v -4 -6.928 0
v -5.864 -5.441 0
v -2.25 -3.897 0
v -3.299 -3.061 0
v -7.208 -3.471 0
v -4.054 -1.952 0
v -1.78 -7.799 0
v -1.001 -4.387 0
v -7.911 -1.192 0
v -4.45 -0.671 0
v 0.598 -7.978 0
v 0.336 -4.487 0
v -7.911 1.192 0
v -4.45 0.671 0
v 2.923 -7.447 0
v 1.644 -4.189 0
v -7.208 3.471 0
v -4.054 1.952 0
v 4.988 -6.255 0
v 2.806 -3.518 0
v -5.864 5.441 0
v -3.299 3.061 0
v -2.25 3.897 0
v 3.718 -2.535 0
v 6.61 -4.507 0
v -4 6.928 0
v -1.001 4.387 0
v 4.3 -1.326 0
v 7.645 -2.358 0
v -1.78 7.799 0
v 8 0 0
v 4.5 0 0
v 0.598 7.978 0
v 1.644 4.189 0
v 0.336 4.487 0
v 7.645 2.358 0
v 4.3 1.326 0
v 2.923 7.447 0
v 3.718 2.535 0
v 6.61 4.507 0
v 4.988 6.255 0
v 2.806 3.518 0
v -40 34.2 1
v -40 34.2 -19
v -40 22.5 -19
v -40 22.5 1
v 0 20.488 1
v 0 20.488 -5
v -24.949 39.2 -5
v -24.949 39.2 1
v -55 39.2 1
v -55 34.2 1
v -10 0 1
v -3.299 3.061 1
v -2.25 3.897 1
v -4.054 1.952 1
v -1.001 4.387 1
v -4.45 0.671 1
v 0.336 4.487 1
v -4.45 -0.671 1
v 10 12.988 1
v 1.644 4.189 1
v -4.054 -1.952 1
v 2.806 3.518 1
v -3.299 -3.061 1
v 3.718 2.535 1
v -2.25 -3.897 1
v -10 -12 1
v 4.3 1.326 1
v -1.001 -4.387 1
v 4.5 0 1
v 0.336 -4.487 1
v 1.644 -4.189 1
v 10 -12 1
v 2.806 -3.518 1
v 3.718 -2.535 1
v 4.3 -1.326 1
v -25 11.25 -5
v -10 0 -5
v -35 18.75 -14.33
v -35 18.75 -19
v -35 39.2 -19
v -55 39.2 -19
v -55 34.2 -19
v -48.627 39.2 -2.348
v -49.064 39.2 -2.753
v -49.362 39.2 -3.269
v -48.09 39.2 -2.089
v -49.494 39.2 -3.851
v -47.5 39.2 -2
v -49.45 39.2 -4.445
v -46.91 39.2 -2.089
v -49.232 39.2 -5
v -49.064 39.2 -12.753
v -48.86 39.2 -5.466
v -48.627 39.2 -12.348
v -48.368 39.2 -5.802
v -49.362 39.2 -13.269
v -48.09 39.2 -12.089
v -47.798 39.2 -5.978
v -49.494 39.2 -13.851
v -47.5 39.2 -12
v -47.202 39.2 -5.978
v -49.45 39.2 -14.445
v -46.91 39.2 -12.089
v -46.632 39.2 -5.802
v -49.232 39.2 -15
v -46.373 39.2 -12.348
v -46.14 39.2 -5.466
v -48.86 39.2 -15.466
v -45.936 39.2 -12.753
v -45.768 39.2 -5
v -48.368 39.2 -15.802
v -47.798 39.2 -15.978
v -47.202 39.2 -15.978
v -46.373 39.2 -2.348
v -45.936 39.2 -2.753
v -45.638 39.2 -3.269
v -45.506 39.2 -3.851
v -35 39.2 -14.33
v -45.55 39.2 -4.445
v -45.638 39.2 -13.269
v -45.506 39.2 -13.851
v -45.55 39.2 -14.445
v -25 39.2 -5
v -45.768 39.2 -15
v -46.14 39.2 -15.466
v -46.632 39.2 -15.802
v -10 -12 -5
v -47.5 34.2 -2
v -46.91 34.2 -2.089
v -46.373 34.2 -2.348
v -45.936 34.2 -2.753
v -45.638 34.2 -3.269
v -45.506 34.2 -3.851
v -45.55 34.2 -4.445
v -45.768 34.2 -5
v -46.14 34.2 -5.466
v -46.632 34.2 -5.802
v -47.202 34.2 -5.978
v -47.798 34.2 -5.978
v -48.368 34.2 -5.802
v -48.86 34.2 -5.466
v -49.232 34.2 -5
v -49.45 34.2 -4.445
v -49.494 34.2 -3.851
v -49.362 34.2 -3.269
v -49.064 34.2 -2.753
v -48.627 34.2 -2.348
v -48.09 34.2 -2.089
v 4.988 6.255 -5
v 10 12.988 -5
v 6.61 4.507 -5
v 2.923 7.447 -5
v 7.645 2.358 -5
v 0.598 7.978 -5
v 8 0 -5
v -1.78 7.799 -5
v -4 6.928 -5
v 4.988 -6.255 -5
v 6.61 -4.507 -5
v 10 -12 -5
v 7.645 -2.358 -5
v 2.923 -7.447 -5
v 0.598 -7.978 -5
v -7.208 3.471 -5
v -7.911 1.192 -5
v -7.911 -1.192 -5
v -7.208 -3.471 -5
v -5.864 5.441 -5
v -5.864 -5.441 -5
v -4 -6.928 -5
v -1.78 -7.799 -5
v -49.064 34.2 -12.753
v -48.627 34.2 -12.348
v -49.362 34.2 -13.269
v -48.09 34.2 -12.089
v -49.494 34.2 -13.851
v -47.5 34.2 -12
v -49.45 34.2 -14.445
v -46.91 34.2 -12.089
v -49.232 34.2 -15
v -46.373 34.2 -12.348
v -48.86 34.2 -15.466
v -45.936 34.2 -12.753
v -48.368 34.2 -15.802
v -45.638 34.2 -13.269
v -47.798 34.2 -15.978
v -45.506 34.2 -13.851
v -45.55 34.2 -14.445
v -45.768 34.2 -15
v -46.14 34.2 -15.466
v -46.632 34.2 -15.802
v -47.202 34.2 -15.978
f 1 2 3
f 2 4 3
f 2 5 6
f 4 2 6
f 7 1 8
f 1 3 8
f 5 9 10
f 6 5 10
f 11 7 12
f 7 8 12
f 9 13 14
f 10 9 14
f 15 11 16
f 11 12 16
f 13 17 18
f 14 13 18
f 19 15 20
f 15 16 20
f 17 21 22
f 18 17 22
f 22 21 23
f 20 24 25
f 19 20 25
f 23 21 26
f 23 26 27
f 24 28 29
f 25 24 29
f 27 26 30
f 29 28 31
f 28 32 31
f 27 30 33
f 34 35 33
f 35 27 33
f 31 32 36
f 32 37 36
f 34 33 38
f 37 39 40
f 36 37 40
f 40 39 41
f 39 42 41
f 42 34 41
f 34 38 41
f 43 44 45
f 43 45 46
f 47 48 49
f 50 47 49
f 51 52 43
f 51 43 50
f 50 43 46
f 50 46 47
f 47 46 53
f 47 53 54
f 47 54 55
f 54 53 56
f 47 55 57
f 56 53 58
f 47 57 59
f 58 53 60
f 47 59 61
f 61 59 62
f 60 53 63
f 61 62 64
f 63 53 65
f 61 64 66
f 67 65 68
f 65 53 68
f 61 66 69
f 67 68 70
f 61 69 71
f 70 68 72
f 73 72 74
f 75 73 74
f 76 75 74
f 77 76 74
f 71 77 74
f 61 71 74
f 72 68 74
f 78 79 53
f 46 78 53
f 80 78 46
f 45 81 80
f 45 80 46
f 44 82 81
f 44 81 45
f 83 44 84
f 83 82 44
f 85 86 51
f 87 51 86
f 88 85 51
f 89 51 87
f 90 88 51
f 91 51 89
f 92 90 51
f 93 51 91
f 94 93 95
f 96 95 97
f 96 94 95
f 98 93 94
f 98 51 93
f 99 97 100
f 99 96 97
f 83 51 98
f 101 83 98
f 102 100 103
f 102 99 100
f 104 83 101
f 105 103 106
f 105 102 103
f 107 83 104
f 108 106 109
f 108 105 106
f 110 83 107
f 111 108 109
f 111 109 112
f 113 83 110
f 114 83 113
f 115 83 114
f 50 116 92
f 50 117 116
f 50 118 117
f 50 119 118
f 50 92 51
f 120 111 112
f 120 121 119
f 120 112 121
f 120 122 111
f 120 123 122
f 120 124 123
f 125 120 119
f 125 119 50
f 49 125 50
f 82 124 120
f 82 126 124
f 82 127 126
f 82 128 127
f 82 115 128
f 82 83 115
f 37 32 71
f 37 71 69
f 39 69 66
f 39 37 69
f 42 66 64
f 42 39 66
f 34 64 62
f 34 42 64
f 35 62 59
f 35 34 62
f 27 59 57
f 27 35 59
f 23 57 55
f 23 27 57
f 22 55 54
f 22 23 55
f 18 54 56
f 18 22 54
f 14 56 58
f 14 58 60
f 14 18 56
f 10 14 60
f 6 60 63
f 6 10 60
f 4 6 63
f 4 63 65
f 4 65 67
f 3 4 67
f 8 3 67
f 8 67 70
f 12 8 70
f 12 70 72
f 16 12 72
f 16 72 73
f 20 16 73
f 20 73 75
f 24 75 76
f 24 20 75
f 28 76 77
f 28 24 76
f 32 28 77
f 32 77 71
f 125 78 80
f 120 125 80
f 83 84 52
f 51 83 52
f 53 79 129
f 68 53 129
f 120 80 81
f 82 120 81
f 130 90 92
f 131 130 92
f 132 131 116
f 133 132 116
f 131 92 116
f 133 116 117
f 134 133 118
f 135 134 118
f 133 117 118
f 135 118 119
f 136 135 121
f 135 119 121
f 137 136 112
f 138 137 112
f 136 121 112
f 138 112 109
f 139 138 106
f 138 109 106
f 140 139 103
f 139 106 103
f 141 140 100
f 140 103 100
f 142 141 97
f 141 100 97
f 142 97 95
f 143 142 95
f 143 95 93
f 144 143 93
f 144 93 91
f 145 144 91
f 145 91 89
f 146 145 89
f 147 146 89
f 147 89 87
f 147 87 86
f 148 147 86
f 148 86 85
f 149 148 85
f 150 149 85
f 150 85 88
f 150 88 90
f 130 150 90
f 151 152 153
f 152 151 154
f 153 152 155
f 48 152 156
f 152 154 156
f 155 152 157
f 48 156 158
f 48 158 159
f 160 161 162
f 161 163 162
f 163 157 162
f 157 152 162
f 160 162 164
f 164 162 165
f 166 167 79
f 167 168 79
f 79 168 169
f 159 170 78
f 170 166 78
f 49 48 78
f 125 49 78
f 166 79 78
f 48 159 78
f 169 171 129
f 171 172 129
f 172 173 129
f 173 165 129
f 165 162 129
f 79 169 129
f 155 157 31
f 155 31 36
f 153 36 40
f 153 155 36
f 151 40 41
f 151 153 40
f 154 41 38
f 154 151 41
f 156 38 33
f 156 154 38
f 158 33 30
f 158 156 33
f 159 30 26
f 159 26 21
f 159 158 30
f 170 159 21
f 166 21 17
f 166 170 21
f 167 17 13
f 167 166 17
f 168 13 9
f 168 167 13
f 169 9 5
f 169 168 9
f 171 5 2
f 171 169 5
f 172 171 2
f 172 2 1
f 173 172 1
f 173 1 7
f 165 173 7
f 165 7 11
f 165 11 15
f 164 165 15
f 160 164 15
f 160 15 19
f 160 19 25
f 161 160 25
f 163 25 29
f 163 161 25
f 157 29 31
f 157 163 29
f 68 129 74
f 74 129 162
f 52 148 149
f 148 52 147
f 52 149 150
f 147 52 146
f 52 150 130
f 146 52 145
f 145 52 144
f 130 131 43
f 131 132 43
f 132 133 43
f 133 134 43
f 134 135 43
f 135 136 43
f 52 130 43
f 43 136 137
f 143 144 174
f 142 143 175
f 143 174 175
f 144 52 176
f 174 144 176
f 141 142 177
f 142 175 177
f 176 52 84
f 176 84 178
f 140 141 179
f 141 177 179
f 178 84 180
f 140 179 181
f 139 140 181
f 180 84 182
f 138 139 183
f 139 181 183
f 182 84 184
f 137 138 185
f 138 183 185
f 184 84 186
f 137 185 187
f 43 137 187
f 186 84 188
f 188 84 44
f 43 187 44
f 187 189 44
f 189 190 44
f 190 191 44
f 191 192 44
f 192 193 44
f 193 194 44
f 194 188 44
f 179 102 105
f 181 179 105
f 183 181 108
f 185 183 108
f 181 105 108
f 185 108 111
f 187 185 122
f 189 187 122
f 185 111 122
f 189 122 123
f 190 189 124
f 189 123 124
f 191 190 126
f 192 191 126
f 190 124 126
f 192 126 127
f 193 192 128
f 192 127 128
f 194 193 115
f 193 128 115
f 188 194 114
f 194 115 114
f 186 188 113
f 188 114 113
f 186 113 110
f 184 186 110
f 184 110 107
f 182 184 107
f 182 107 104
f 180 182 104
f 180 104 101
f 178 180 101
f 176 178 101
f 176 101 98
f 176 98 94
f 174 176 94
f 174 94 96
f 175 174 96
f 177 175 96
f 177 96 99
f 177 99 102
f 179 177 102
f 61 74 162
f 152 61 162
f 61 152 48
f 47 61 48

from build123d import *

# Parameters (mm, degrees)
SKETCH1_R               = 10
SKETCH1_R_2             = 8
SKETCH1_R_3             = 4.5
BOSS_EXTRUDE1_DEPTH     = 1
BOSS_EXTRUDE2_START     = -5
SKETCH1_4_R             = 10
SKETCH1_4_R_2           = 8
BOSS_EXTRUDE2_DEPTH     = 5
BOSS_EXTRUDE3_START     = -6
BOSS_EXTRUDE3_DEPTH     = 6
BOSS_EXTRUDE4_DEPTH     = 5
BOSS_EXTRUDE5_REACH     = 76.3
SKETCH4_R               = 2
CUT_EXTRUDE1_DEPTH      = 78.507677039
CUT_EXTRUDE2_DEPTH      = 71.438909702
CUT_EXTRUDE2_DEPTH_BACK = 71.438909702


with BuildPart() as part:
    # Sketch1 → Boss-Extrude1 (new body)
    # profile 1 of 2: a face of its own
    with BuildSketch(Plane.XY):
        Circle(SKETCH1_R)
        Circle(SKETCH1_R_2, mode=Mode.SUBTRACT)
    # profile 2 of 2: a face of its own
    with BuildSketch(Plane.XY):
        Circle(SKETCH1_R_2)
        Circle(SKETCH1_R_3, mode=Mode.SUBTRACT)
    extrude(amount=BOSS_EXTRUDE1_DEPTH)

    # Sketch1<4> → Boss-Extrude2 (add)
    with BuildSketch(Plane.XY.offset(BOSS_EXTRUDE2_START)):
        Circle(SKETCH1_4_R)
        Circle(SKETCH1_4_R_2, mode=Mode.SUBTRACT)
    extrude(amount=BOSS_EXTRUDE2_DEPTH)

    # Sketch2 → Boss-Extrude3 (add)
    with BuildSketch(Plane.XY.offset(1).offset(BOSS_EXTRUDE3_START)):
        with BuildLine():
            Line((-40, 34.2), (-40, 22.5))
            Line((-40, 22.5), (-10, 0))
            ThreePointArc((-10, 0), (0, 10), (10, 0))
            Line((10, 0), (10, 34.2))
            Line((10, 34.2), (-40, 34.2))
        make_face()
        with BuildLine():
            ThreePointArc((10, 0), (0, -10), (-10, 0))
            Line((-10, 0), (-10, -12))
            Line((-10, -12), (10, -12))
            Line((10, -12), (10, 0))
        make_face()
    extrude(amount=BOSS_EXTRUDE3_DEPTH)

    # Sketch3 → Boss-Extrude4 (add)
    with BuildSketch(Plane(origin=(0, 34.2, 0), x_dir=(1, 0, 0), z_dir=(0, 1, 0))):
        Polygon((-55, -1), (-40, -1), (-40, 5), (-40, 19), (-55, 19), align=None)
        Polygon((-40, 19), (-40, 5), (-35, 5), (-35, 14.33), (-35, 19), align=None)
        Polygon((-35, 14.33), (-35, 5), (-25, 5), align=None)
        Polygon((-40, 5), (-40, -1), (10, -1), (10, 5), (-25, 5), (-35, 5), align=None)
    extrude(amount=BOSS_EXTRUDE4_DEPTH)

    # Boss-Extrude5: up to this plane
    boss_extrude5_end = Plane(origin=(-3.6, -4.8, -65.577553599), z_dir=(-0.6000000000000177, -0.7999999999999867, 0))
    # Sketch3<4> → Boss-Extrude5 (add, up to the surface)
    with BuildSketch(Plane(origin=(0, 34.2, 0), x_dir=(1, 0, 0), z_dir=(0, 1, 0)), mode=Mode.PRIVATE) as boss_extrude5_sk1:
        Polygon((-40, 19), (-40, 5), (-35, 5), (-35, 14.33), (-35, 19), align=None)
    boss_extrude5_tool1 = split(extrude(boss_extrude5_sk1.sketch, amount=-BOSS_EXTRUDE5_REACH, mode=Mode.PRIVATE), bisect_by=boss_extrude5_end, keep=Keep.BOTH, mode=Mode.PRIVATE)
    add(boss_extrude5_tool1.solids().sort_by_distance((-37.5, 34.2, -12))[0])
    # Sketch3<4> → Boss-Extrude5 (add, up to the surface)
    with BuildSketch(Plane(origin=(0, 34.2, 0), x_dir=(1, 0, 0), z_dir=(0, 1, 0)), mode=Mode.PRIVATE) as boss_extrude5_sk2:
        Polygon((-35, 14.33), (-35, 5), (-25, 5), align=None)
    boss_extrude5_tool2 = split(extrude(boss_extrude5_sk2.sketch, amount=-BOSS_EXTRUDE5_REACH, mode=Mode.PRIVATE), bisect_by=boss_extrude5_end, keep=Keep.BOTH, mode=Mode.PRIVATE)
    add(boss_extrude5_tool2.solids().sort_by_distance((-31.666667, 34.2, -8.11))[0])

    # Sketch4 → Cut-Extrude1 (cut, through all)
    with BuildSketch(Plane(origin=(0, 39.2, 0), x_dir=(1, 0, 0), z_dir=(0, 1, 0))):
        with Locations(Location((-47.5, 14, 0), (0, 0, 270))):
            Circle(SKETCH4_R)
        with Locations(Location((-47.5, 4, 0), (0, 0, 270))):
            Circle(SKETCH4_R)
    extrude(amount=-CUT_EXTRUDE1_DEPTH, mode=Mode.SUBTRACT)

    # Sketch5 → Cut-Extrude2 (cut, two sides: drawn at the far end of the back side and taken through both)
    with BuildSketch(Plane.XY.offset(1).offset(-CUT_EXTRUDE2_DEPTH_BACK)):
        Polygon((0, 20.48842356), (-24.948768587, 39.2), (10, 39.2), (10, 12.98842356), align=None)
    extrude(amount=CUT_EXTRUDE2_DEPTH + CUT_EXTRUDE2_DEPTH_BACK, mode=Mode.SUBTRACT)


solid = part.part
